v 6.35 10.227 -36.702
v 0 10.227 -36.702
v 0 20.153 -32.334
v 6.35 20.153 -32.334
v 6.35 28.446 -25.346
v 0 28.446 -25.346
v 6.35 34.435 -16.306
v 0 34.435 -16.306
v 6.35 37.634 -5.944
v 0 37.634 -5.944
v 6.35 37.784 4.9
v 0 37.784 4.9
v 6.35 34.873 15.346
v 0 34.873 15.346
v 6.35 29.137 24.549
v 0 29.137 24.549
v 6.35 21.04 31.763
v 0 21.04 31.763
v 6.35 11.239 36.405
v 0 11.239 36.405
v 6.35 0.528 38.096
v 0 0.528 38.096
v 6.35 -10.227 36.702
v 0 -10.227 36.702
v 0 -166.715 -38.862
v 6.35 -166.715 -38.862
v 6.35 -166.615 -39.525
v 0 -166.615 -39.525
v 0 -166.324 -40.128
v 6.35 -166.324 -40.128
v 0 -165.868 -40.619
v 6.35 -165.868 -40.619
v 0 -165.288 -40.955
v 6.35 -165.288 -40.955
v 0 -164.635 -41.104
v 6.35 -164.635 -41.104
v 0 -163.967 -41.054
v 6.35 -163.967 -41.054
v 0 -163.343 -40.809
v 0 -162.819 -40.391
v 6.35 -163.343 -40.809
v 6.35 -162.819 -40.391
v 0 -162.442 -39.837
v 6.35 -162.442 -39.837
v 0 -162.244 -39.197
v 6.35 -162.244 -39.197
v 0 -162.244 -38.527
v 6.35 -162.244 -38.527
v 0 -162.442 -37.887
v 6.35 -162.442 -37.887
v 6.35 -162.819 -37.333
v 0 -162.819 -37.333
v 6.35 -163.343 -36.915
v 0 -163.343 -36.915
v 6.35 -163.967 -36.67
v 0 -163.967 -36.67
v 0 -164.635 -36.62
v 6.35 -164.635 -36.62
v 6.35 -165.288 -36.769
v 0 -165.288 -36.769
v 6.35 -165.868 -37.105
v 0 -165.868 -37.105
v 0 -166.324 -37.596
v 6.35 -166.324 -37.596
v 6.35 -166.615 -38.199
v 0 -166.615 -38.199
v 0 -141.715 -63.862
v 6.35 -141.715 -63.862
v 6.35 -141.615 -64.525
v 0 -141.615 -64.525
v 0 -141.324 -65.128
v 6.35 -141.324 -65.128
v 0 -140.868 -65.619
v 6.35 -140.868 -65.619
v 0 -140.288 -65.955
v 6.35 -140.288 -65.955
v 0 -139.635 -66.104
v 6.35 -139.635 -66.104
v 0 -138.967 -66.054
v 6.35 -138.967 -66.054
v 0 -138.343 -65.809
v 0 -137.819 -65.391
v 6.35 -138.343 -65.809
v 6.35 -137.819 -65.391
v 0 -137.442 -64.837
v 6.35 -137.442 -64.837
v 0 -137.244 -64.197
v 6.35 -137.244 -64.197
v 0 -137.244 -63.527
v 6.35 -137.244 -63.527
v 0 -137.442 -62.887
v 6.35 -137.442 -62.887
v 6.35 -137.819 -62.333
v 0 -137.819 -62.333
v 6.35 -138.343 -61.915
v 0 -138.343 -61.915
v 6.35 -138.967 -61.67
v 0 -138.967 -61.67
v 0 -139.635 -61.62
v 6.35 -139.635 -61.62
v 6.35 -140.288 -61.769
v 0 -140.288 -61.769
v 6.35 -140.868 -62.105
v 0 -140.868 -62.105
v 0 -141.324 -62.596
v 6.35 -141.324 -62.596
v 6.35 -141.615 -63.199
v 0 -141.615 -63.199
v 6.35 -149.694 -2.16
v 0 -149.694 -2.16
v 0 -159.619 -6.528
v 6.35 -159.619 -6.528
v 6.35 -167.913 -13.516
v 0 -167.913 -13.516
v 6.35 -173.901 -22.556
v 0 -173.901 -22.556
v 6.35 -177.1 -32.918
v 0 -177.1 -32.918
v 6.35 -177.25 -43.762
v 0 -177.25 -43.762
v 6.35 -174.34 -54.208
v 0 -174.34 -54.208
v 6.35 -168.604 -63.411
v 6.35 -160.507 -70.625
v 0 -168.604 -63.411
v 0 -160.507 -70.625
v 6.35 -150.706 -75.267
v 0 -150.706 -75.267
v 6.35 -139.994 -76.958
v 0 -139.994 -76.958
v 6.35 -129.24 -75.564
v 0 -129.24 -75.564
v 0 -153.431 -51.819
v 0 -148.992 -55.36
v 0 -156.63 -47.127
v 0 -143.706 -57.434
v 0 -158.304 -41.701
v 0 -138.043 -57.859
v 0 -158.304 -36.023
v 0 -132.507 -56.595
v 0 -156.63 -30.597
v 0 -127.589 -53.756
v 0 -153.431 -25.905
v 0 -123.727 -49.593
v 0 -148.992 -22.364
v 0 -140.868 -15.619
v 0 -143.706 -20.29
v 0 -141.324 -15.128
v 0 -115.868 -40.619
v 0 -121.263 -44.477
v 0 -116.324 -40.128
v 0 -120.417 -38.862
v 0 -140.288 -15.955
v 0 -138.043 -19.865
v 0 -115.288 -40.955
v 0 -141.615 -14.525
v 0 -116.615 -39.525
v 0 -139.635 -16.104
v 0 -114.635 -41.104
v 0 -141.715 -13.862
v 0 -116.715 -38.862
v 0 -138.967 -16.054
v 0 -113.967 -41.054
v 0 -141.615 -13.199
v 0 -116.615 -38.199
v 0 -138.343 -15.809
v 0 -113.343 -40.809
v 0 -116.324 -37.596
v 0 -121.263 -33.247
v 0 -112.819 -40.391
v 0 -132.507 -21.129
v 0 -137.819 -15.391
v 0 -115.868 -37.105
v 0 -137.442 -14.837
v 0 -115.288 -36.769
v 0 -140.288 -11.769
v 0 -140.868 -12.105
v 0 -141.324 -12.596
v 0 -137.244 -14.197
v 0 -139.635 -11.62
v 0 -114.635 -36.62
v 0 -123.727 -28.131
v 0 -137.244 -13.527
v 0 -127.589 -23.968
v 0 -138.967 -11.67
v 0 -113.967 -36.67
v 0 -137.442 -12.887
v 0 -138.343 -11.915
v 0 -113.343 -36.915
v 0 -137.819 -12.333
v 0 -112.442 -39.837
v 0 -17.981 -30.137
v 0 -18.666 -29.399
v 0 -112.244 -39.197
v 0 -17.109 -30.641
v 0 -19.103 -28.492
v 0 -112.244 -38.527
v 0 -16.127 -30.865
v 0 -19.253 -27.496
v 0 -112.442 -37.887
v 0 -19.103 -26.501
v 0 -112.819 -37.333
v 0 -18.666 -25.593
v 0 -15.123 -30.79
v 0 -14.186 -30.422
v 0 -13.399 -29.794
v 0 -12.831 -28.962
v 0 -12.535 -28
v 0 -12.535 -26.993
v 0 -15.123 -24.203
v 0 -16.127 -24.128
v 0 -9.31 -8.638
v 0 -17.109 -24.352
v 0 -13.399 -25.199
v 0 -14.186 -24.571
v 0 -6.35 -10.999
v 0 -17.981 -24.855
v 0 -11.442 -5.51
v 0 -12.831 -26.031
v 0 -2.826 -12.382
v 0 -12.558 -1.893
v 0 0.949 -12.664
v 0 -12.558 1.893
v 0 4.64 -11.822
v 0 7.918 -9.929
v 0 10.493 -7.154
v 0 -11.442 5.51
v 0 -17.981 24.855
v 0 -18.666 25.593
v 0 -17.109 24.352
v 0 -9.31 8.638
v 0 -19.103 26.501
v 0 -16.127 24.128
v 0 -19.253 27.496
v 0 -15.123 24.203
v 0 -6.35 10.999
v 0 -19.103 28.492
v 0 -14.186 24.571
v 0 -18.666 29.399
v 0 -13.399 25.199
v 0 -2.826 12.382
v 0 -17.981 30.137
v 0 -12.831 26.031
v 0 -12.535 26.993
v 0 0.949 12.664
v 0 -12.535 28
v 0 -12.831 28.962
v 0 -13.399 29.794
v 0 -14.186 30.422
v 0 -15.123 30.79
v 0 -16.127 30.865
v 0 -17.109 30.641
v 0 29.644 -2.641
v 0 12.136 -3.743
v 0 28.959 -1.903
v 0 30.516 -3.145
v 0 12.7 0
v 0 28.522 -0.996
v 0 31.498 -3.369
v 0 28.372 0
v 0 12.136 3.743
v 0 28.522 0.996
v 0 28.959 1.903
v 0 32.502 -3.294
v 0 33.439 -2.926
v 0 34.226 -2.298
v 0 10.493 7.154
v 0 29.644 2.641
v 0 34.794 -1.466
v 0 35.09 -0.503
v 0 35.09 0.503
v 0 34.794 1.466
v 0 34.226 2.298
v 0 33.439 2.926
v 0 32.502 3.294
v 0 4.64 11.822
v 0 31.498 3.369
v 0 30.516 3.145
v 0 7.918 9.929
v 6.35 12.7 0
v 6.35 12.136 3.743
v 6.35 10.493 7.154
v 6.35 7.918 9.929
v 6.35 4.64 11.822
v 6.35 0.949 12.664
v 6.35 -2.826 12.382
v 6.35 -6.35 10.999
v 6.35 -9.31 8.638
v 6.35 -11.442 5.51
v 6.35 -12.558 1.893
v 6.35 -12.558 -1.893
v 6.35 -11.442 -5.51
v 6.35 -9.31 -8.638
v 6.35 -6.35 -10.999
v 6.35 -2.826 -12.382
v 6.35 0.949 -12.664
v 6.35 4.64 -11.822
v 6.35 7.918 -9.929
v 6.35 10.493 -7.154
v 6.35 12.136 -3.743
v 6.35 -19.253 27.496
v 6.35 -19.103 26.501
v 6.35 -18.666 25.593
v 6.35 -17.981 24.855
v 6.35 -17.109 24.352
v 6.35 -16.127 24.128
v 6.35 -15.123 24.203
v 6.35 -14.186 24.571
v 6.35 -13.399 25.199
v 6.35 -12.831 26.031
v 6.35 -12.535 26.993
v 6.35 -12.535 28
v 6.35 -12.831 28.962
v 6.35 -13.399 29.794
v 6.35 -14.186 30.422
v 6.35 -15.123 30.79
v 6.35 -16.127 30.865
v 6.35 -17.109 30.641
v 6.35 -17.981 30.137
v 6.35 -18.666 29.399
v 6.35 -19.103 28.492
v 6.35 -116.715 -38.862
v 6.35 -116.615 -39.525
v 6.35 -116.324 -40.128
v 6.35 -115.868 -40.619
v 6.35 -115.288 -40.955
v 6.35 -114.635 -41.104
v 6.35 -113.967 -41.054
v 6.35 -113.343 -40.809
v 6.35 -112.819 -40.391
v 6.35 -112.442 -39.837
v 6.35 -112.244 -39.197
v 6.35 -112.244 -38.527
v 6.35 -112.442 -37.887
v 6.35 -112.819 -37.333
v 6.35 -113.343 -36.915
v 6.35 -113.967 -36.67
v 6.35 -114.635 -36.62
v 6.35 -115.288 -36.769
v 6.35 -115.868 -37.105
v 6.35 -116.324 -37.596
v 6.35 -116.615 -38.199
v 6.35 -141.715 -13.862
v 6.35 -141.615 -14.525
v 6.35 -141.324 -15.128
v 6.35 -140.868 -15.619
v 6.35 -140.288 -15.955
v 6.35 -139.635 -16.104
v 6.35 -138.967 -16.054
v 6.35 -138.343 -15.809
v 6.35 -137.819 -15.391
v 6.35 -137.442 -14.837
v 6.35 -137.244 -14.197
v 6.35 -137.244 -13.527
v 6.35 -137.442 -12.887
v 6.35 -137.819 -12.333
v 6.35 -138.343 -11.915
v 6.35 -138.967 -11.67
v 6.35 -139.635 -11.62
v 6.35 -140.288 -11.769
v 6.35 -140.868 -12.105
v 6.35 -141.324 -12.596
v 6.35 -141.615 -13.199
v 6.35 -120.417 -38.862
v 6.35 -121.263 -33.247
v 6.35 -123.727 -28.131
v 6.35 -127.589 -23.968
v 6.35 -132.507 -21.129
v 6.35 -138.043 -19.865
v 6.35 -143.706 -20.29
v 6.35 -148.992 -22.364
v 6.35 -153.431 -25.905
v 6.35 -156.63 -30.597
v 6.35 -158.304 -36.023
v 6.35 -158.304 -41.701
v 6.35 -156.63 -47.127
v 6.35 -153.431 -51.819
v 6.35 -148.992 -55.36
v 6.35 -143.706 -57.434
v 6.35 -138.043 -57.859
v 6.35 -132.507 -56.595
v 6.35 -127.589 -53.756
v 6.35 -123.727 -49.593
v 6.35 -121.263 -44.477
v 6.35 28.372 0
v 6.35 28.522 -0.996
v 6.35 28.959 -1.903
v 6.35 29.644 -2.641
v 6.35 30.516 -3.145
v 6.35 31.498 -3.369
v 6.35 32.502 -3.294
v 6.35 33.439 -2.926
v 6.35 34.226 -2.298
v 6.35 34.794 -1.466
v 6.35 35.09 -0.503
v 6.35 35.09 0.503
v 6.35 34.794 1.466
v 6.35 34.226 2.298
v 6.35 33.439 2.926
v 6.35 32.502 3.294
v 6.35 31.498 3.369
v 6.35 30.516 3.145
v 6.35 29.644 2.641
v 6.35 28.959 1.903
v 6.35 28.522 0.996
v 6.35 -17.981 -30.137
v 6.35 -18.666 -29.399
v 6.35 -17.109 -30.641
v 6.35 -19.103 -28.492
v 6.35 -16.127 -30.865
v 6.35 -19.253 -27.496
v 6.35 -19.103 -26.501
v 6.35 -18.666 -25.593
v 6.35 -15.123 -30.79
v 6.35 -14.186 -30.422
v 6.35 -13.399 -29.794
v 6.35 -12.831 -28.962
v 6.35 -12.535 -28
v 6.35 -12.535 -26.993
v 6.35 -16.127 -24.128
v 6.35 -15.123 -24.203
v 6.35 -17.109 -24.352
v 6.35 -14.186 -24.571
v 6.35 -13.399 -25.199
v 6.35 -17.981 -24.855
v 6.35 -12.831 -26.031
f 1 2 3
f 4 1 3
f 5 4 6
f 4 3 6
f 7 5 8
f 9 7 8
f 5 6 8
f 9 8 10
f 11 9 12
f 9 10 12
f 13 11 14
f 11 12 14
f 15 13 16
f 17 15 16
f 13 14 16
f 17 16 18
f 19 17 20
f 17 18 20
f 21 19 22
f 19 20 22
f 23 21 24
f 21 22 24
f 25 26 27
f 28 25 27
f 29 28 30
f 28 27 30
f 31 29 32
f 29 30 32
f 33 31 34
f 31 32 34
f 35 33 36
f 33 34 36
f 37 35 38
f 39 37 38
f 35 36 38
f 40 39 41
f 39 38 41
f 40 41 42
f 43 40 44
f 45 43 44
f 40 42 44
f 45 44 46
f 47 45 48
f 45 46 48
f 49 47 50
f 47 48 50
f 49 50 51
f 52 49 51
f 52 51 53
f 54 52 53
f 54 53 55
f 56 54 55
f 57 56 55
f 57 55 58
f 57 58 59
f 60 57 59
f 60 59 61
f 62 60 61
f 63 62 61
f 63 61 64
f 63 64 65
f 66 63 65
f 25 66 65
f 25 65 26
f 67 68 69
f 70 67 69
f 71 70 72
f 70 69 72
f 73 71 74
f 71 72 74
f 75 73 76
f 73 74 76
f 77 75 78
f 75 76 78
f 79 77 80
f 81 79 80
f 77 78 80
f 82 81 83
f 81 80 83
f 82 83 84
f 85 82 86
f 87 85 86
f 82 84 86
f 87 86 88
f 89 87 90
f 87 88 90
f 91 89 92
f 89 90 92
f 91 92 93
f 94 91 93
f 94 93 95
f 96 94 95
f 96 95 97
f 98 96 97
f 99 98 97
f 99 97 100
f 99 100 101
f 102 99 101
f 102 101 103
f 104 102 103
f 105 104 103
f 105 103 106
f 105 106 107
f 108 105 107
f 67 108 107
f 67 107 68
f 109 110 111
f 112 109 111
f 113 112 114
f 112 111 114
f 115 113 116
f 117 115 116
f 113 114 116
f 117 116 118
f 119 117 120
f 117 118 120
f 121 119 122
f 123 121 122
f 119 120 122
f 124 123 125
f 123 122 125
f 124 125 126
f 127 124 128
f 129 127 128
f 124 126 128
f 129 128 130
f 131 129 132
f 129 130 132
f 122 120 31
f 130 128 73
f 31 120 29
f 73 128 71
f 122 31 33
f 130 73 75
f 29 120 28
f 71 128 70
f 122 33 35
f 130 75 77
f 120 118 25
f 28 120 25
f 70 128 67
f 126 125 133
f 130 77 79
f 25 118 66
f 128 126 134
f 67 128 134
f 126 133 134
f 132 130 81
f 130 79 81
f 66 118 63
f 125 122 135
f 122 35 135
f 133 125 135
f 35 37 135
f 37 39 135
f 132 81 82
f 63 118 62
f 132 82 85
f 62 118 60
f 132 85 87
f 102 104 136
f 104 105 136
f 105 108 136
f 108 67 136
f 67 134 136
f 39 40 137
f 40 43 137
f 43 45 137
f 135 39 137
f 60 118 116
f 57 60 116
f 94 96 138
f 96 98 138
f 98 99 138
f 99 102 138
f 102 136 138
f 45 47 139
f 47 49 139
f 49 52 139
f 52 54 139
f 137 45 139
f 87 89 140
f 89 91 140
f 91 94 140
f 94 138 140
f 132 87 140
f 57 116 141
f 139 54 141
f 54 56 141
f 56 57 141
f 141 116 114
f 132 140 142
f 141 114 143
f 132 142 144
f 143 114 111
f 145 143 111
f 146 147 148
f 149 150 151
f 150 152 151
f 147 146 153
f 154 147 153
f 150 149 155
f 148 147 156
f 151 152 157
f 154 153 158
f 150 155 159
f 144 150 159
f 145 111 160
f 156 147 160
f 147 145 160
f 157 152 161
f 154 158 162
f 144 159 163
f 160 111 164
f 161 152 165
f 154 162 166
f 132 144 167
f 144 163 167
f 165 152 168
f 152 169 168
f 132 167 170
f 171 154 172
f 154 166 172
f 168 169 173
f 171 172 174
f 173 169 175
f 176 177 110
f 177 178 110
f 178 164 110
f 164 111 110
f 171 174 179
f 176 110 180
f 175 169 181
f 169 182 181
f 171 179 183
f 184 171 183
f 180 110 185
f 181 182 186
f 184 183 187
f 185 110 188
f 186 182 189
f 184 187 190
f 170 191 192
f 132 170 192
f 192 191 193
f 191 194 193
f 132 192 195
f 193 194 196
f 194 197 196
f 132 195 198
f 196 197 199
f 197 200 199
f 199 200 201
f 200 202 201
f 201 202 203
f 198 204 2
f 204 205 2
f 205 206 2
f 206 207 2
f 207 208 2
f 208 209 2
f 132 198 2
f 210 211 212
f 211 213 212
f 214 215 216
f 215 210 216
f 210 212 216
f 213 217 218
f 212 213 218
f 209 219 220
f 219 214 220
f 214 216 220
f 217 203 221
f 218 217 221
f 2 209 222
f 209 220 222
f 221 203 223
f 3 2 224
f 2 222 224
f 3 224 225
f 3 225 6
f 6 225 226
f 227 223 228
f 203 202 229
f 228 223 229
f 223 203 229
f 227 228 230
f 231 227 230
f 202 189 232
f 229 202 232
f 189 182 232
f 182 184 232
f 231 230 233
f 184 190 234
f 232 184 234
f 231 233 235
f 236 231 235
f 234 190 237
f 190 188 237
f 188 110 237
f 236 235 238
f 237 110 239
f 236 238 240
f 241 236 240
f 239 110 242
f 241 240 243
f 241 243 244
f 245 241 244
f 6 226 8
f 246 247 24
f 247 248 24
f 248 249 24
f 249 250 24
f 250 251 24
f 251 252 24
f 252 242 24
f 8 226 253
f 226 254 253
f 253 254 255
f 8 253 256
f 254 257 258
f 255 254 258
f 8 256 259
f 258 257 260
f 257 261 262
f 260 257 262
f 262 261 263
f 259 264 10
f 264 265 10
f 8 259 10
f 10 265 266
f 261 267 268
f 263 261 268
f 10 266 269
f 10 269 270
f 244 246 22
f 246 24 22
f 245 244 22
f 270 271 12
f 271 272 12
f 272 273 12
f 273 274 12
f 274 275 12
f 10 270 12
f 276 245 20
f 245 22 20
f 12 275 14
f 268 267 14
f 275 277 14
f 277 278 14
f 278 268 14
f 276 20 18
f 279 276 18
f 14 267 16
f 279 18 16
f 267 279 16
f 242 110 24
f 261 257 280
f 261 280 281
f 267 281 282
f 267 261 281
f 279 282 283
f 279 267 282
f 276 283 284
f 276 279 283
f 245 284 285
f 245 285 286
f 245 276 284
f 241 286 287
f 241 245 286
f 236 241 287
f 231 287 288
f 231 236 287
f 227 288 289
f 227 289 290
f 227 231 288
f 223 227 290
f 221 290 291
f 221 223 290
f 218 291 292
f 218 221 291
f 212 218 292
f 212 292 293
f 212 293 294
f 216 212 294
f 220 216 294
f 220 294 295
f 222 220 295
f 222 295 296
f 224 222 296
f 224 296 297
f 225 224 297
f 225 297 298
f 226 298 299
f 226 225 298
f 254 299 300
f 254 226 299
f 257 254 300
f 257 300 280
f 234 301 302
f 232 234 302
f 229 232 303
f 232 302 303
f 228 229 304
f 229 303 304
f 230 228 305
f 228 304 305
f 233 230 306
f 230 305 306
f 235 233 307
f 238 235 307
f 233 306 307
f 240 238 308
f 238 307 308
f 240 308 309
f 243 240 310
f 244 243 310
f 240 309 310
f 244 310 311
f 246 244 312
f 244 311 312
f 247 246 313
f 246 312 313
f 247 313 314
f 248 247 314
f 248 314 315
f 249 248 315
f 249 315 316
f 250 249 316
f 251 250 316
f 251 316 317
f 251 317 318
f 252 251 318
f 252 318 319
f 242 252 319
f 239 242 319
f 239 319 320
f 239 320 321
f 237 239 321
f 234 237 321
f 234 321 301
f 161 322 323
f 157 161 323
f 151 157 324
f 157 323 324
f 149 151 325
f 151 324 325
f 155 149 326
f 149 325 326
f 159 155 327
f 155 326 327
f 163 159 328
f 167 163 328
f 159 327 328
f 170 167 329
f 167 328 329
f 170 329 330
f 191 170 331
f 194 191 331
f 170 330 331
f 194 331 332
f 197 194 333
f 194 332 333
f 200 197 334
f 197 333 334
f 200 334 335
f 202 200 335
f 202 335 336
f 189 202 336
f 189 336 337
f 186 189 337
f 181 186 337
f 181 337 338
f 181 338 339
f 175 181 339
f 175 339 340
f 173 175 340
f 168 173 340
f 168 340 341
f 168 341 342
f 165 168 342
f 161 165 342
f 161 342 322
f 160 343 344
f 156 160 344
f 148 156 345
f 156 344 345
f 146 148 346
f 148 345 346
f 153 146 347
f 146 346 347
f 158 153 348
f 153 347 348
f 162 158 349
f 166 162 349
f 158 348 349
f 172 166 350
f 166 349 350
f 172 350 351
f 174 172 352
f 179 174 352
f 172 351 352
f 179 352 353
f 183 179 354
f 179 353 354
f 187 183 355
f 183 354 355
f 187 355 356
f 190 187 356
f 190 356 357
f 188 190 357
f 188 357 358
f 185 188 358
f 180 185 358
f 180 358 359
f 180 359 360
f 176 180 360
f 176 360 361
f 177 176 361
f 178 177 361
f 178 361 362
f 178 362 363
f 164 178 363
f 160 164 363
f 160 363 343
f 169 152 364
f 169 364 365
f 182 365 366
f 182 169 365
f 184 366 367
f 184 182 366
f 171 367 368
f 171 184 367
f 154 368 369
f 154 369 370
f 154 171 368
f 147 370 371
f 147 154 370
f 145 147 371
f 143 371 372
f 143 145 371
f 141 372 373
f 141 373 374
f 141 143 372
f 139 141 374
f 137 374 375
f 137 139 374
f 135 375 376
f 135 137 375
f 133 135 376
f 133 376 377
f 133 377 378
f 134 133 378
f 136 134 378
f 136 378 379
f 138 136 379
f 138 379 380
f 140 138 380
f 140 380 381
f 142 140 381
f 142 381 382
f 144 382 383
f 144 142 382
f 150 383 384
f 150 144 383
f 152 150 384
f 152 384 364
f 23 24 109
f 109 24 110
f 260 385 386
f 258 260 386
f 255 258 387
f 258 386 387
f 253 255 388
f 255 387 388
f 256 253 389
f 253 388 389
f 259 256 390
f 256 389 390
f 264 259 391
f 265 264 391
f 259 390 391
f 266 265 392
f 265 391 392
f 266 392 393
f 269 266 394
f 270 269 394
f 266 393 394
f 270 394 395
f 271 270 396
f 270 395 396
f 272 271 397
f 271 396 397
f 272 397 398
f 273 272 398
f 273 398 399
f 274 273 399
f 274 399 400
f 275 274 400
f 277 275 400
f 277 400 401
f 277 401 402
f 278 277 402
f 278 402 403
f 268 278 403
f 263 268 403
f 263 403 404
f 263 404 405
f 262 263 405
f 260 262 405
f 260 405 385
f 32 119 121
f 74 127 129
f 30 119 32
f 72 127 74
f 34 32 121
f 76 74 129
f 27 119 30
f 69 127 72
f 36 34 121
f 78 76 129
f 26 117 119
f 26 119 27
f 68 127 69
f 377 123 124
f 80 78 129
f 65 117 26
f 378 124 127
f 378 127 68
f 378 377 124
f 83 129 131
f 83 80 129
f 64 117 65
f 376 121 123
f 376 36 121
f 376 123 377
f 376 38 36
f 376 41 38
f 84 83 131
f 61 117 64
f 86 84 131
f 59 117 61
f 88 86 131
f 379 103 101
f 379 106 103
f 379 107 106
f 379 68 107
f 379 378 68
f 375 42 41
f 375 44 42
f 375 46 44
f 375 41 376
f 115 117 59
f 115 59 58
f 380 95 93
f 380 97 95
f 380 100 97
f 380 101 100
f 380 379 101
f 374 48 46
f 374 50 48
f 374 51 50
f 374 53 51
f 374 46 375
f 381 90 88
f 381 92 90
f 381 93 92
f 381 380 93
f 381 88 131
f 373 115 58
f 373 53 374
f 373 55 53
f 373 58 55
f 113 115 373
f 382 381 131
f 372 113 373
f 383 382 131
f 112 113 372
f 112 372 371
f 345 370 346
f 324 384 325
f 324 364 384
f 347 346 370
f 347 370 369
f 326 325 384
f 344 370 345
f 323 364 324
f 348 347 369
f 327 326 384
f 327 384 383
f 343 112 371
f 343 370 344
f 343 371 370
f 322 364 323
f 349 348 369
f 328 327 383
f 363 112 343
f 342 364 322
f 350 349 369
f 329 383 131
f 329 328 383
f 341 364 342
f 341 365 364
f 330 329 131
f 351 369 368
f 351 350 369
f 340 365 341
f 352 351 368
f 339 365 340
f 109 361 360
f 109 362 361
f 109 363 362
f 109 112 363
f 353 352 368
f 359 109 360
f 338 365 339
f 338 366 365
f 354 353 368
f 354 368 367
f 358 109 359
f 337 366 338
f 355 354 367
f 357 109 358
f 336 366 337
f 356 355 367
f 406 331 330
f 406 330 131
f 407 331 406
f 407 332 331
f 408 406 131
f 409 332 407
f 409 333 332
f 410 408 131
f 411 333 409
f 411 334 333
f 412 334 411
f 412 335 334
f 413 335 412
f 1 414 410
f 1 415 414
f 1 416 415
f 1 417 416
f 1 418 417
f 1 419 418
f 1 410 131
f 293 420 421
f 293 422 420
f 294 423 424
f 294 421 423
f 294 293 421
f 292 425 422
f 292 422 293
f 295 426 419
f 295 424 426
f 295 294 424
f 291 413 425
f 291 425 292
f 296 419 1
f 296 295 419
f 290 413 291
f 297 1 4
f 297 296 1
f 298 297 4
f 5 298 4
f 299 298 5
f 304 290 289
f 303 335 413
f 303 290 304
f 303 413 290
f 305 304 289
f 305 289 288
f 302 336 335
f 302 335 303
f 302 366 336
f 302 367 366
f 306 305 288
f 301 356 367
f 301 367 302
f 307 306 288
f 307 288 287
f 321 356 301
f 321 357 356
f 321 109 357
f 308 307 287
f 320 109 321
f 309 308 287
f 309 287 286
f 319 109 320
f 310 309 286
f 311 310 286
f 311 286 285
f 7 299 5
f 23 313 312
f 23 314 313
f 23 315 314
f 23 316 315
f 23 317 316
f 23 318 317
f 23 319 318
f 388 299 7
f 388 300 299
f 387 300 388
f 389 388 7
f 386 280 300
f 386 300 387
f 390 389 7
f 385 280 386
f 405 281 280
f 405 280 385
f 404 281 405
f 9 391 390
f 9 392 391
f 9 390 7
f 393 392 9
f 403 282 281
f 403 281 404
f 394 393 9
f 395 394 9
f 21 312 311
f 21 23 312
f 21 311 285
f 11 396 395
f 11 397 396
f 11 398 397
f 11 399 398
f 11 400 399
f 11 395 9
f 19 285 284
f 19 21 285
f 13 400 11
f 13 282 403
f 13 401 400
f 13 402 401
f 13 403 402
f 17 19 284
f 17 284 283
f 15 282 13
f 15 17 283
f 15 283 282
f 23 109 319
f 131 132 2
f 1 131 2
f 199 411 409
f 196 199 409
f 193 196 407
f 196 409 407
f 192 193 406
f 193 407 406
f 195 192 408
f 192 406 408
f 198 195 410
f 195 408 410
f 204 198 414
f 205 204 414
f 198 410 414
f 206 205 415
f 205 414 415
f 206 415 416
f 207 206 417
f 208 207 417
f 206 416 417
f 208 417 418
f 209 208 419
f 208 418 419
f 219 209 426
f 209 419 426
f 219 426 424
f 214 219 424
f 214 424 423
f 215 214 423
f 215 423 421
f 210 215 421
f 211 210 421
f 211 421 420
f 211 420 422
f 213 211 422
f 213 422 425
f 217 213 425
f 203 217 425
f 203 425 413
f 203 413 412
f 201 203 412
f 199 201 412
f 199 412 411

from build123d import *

# Parameters (mm, degrees)
F0_R     = 19.05
F0_R_2   = 12.7
F1_DEPTH = 6.35
F2_D     = 4.4958
F3_D     = 6.7564


with BuildPart() as f1:
    # F0 (on Right) → F1 (new body)
    with BuildSketch(Plane.YZ):
        with BuildLine():
            Line((-129.2399760129, -75.5637942416), (10.2268421053, -36.7017942416))
            ThreePointArc((10.2268421053, -36.7017942416), (36.7017942416, 10.2268421053), (-10.2268421053, 36.7017942416))
            Line((-10.2268421053, 36.7017942416), (-149.6936602234, -2.1602057584))
            ThreePointArc((-149.6936602234, -2.1602057584), (-176.1686123598, -49.0888421053), (-129.2399760129, -75.5637942416))
        make_face()
        with Locations((-139.4668181181, -38.862)):
            Circle(F0_R, mode=Mode.SUBTRACT)
        Circle(F0_R_2, mode=Mode.SUBTRACT)
    extrude(amount=F1_DEPTH)

    # F2 (through all)
    with Locations(Plane(origin=(0, 0, 0), x_dir=(0, 1, 0), z_dir=(-1, 0, 0))):
        with Locations((-139.4668181181, 13.862), (-164.4668181181, 38.862), (-114.4668181181, 38.862), (-139.4668181181, 63.862)):
            Hole(F2_D / 2)

    # F3 (through all)
    with Locations(Plane(origin=(0, 0, 0), x_dir=(0, 1, 0), z_dir=(-1, 0, 0))):
        with Locations((-15.875, -27.4963065702), (-15.875, 27.4963065702), (31.75, 0)):
            Hole(F3_D / 2)


solid = f1.part
